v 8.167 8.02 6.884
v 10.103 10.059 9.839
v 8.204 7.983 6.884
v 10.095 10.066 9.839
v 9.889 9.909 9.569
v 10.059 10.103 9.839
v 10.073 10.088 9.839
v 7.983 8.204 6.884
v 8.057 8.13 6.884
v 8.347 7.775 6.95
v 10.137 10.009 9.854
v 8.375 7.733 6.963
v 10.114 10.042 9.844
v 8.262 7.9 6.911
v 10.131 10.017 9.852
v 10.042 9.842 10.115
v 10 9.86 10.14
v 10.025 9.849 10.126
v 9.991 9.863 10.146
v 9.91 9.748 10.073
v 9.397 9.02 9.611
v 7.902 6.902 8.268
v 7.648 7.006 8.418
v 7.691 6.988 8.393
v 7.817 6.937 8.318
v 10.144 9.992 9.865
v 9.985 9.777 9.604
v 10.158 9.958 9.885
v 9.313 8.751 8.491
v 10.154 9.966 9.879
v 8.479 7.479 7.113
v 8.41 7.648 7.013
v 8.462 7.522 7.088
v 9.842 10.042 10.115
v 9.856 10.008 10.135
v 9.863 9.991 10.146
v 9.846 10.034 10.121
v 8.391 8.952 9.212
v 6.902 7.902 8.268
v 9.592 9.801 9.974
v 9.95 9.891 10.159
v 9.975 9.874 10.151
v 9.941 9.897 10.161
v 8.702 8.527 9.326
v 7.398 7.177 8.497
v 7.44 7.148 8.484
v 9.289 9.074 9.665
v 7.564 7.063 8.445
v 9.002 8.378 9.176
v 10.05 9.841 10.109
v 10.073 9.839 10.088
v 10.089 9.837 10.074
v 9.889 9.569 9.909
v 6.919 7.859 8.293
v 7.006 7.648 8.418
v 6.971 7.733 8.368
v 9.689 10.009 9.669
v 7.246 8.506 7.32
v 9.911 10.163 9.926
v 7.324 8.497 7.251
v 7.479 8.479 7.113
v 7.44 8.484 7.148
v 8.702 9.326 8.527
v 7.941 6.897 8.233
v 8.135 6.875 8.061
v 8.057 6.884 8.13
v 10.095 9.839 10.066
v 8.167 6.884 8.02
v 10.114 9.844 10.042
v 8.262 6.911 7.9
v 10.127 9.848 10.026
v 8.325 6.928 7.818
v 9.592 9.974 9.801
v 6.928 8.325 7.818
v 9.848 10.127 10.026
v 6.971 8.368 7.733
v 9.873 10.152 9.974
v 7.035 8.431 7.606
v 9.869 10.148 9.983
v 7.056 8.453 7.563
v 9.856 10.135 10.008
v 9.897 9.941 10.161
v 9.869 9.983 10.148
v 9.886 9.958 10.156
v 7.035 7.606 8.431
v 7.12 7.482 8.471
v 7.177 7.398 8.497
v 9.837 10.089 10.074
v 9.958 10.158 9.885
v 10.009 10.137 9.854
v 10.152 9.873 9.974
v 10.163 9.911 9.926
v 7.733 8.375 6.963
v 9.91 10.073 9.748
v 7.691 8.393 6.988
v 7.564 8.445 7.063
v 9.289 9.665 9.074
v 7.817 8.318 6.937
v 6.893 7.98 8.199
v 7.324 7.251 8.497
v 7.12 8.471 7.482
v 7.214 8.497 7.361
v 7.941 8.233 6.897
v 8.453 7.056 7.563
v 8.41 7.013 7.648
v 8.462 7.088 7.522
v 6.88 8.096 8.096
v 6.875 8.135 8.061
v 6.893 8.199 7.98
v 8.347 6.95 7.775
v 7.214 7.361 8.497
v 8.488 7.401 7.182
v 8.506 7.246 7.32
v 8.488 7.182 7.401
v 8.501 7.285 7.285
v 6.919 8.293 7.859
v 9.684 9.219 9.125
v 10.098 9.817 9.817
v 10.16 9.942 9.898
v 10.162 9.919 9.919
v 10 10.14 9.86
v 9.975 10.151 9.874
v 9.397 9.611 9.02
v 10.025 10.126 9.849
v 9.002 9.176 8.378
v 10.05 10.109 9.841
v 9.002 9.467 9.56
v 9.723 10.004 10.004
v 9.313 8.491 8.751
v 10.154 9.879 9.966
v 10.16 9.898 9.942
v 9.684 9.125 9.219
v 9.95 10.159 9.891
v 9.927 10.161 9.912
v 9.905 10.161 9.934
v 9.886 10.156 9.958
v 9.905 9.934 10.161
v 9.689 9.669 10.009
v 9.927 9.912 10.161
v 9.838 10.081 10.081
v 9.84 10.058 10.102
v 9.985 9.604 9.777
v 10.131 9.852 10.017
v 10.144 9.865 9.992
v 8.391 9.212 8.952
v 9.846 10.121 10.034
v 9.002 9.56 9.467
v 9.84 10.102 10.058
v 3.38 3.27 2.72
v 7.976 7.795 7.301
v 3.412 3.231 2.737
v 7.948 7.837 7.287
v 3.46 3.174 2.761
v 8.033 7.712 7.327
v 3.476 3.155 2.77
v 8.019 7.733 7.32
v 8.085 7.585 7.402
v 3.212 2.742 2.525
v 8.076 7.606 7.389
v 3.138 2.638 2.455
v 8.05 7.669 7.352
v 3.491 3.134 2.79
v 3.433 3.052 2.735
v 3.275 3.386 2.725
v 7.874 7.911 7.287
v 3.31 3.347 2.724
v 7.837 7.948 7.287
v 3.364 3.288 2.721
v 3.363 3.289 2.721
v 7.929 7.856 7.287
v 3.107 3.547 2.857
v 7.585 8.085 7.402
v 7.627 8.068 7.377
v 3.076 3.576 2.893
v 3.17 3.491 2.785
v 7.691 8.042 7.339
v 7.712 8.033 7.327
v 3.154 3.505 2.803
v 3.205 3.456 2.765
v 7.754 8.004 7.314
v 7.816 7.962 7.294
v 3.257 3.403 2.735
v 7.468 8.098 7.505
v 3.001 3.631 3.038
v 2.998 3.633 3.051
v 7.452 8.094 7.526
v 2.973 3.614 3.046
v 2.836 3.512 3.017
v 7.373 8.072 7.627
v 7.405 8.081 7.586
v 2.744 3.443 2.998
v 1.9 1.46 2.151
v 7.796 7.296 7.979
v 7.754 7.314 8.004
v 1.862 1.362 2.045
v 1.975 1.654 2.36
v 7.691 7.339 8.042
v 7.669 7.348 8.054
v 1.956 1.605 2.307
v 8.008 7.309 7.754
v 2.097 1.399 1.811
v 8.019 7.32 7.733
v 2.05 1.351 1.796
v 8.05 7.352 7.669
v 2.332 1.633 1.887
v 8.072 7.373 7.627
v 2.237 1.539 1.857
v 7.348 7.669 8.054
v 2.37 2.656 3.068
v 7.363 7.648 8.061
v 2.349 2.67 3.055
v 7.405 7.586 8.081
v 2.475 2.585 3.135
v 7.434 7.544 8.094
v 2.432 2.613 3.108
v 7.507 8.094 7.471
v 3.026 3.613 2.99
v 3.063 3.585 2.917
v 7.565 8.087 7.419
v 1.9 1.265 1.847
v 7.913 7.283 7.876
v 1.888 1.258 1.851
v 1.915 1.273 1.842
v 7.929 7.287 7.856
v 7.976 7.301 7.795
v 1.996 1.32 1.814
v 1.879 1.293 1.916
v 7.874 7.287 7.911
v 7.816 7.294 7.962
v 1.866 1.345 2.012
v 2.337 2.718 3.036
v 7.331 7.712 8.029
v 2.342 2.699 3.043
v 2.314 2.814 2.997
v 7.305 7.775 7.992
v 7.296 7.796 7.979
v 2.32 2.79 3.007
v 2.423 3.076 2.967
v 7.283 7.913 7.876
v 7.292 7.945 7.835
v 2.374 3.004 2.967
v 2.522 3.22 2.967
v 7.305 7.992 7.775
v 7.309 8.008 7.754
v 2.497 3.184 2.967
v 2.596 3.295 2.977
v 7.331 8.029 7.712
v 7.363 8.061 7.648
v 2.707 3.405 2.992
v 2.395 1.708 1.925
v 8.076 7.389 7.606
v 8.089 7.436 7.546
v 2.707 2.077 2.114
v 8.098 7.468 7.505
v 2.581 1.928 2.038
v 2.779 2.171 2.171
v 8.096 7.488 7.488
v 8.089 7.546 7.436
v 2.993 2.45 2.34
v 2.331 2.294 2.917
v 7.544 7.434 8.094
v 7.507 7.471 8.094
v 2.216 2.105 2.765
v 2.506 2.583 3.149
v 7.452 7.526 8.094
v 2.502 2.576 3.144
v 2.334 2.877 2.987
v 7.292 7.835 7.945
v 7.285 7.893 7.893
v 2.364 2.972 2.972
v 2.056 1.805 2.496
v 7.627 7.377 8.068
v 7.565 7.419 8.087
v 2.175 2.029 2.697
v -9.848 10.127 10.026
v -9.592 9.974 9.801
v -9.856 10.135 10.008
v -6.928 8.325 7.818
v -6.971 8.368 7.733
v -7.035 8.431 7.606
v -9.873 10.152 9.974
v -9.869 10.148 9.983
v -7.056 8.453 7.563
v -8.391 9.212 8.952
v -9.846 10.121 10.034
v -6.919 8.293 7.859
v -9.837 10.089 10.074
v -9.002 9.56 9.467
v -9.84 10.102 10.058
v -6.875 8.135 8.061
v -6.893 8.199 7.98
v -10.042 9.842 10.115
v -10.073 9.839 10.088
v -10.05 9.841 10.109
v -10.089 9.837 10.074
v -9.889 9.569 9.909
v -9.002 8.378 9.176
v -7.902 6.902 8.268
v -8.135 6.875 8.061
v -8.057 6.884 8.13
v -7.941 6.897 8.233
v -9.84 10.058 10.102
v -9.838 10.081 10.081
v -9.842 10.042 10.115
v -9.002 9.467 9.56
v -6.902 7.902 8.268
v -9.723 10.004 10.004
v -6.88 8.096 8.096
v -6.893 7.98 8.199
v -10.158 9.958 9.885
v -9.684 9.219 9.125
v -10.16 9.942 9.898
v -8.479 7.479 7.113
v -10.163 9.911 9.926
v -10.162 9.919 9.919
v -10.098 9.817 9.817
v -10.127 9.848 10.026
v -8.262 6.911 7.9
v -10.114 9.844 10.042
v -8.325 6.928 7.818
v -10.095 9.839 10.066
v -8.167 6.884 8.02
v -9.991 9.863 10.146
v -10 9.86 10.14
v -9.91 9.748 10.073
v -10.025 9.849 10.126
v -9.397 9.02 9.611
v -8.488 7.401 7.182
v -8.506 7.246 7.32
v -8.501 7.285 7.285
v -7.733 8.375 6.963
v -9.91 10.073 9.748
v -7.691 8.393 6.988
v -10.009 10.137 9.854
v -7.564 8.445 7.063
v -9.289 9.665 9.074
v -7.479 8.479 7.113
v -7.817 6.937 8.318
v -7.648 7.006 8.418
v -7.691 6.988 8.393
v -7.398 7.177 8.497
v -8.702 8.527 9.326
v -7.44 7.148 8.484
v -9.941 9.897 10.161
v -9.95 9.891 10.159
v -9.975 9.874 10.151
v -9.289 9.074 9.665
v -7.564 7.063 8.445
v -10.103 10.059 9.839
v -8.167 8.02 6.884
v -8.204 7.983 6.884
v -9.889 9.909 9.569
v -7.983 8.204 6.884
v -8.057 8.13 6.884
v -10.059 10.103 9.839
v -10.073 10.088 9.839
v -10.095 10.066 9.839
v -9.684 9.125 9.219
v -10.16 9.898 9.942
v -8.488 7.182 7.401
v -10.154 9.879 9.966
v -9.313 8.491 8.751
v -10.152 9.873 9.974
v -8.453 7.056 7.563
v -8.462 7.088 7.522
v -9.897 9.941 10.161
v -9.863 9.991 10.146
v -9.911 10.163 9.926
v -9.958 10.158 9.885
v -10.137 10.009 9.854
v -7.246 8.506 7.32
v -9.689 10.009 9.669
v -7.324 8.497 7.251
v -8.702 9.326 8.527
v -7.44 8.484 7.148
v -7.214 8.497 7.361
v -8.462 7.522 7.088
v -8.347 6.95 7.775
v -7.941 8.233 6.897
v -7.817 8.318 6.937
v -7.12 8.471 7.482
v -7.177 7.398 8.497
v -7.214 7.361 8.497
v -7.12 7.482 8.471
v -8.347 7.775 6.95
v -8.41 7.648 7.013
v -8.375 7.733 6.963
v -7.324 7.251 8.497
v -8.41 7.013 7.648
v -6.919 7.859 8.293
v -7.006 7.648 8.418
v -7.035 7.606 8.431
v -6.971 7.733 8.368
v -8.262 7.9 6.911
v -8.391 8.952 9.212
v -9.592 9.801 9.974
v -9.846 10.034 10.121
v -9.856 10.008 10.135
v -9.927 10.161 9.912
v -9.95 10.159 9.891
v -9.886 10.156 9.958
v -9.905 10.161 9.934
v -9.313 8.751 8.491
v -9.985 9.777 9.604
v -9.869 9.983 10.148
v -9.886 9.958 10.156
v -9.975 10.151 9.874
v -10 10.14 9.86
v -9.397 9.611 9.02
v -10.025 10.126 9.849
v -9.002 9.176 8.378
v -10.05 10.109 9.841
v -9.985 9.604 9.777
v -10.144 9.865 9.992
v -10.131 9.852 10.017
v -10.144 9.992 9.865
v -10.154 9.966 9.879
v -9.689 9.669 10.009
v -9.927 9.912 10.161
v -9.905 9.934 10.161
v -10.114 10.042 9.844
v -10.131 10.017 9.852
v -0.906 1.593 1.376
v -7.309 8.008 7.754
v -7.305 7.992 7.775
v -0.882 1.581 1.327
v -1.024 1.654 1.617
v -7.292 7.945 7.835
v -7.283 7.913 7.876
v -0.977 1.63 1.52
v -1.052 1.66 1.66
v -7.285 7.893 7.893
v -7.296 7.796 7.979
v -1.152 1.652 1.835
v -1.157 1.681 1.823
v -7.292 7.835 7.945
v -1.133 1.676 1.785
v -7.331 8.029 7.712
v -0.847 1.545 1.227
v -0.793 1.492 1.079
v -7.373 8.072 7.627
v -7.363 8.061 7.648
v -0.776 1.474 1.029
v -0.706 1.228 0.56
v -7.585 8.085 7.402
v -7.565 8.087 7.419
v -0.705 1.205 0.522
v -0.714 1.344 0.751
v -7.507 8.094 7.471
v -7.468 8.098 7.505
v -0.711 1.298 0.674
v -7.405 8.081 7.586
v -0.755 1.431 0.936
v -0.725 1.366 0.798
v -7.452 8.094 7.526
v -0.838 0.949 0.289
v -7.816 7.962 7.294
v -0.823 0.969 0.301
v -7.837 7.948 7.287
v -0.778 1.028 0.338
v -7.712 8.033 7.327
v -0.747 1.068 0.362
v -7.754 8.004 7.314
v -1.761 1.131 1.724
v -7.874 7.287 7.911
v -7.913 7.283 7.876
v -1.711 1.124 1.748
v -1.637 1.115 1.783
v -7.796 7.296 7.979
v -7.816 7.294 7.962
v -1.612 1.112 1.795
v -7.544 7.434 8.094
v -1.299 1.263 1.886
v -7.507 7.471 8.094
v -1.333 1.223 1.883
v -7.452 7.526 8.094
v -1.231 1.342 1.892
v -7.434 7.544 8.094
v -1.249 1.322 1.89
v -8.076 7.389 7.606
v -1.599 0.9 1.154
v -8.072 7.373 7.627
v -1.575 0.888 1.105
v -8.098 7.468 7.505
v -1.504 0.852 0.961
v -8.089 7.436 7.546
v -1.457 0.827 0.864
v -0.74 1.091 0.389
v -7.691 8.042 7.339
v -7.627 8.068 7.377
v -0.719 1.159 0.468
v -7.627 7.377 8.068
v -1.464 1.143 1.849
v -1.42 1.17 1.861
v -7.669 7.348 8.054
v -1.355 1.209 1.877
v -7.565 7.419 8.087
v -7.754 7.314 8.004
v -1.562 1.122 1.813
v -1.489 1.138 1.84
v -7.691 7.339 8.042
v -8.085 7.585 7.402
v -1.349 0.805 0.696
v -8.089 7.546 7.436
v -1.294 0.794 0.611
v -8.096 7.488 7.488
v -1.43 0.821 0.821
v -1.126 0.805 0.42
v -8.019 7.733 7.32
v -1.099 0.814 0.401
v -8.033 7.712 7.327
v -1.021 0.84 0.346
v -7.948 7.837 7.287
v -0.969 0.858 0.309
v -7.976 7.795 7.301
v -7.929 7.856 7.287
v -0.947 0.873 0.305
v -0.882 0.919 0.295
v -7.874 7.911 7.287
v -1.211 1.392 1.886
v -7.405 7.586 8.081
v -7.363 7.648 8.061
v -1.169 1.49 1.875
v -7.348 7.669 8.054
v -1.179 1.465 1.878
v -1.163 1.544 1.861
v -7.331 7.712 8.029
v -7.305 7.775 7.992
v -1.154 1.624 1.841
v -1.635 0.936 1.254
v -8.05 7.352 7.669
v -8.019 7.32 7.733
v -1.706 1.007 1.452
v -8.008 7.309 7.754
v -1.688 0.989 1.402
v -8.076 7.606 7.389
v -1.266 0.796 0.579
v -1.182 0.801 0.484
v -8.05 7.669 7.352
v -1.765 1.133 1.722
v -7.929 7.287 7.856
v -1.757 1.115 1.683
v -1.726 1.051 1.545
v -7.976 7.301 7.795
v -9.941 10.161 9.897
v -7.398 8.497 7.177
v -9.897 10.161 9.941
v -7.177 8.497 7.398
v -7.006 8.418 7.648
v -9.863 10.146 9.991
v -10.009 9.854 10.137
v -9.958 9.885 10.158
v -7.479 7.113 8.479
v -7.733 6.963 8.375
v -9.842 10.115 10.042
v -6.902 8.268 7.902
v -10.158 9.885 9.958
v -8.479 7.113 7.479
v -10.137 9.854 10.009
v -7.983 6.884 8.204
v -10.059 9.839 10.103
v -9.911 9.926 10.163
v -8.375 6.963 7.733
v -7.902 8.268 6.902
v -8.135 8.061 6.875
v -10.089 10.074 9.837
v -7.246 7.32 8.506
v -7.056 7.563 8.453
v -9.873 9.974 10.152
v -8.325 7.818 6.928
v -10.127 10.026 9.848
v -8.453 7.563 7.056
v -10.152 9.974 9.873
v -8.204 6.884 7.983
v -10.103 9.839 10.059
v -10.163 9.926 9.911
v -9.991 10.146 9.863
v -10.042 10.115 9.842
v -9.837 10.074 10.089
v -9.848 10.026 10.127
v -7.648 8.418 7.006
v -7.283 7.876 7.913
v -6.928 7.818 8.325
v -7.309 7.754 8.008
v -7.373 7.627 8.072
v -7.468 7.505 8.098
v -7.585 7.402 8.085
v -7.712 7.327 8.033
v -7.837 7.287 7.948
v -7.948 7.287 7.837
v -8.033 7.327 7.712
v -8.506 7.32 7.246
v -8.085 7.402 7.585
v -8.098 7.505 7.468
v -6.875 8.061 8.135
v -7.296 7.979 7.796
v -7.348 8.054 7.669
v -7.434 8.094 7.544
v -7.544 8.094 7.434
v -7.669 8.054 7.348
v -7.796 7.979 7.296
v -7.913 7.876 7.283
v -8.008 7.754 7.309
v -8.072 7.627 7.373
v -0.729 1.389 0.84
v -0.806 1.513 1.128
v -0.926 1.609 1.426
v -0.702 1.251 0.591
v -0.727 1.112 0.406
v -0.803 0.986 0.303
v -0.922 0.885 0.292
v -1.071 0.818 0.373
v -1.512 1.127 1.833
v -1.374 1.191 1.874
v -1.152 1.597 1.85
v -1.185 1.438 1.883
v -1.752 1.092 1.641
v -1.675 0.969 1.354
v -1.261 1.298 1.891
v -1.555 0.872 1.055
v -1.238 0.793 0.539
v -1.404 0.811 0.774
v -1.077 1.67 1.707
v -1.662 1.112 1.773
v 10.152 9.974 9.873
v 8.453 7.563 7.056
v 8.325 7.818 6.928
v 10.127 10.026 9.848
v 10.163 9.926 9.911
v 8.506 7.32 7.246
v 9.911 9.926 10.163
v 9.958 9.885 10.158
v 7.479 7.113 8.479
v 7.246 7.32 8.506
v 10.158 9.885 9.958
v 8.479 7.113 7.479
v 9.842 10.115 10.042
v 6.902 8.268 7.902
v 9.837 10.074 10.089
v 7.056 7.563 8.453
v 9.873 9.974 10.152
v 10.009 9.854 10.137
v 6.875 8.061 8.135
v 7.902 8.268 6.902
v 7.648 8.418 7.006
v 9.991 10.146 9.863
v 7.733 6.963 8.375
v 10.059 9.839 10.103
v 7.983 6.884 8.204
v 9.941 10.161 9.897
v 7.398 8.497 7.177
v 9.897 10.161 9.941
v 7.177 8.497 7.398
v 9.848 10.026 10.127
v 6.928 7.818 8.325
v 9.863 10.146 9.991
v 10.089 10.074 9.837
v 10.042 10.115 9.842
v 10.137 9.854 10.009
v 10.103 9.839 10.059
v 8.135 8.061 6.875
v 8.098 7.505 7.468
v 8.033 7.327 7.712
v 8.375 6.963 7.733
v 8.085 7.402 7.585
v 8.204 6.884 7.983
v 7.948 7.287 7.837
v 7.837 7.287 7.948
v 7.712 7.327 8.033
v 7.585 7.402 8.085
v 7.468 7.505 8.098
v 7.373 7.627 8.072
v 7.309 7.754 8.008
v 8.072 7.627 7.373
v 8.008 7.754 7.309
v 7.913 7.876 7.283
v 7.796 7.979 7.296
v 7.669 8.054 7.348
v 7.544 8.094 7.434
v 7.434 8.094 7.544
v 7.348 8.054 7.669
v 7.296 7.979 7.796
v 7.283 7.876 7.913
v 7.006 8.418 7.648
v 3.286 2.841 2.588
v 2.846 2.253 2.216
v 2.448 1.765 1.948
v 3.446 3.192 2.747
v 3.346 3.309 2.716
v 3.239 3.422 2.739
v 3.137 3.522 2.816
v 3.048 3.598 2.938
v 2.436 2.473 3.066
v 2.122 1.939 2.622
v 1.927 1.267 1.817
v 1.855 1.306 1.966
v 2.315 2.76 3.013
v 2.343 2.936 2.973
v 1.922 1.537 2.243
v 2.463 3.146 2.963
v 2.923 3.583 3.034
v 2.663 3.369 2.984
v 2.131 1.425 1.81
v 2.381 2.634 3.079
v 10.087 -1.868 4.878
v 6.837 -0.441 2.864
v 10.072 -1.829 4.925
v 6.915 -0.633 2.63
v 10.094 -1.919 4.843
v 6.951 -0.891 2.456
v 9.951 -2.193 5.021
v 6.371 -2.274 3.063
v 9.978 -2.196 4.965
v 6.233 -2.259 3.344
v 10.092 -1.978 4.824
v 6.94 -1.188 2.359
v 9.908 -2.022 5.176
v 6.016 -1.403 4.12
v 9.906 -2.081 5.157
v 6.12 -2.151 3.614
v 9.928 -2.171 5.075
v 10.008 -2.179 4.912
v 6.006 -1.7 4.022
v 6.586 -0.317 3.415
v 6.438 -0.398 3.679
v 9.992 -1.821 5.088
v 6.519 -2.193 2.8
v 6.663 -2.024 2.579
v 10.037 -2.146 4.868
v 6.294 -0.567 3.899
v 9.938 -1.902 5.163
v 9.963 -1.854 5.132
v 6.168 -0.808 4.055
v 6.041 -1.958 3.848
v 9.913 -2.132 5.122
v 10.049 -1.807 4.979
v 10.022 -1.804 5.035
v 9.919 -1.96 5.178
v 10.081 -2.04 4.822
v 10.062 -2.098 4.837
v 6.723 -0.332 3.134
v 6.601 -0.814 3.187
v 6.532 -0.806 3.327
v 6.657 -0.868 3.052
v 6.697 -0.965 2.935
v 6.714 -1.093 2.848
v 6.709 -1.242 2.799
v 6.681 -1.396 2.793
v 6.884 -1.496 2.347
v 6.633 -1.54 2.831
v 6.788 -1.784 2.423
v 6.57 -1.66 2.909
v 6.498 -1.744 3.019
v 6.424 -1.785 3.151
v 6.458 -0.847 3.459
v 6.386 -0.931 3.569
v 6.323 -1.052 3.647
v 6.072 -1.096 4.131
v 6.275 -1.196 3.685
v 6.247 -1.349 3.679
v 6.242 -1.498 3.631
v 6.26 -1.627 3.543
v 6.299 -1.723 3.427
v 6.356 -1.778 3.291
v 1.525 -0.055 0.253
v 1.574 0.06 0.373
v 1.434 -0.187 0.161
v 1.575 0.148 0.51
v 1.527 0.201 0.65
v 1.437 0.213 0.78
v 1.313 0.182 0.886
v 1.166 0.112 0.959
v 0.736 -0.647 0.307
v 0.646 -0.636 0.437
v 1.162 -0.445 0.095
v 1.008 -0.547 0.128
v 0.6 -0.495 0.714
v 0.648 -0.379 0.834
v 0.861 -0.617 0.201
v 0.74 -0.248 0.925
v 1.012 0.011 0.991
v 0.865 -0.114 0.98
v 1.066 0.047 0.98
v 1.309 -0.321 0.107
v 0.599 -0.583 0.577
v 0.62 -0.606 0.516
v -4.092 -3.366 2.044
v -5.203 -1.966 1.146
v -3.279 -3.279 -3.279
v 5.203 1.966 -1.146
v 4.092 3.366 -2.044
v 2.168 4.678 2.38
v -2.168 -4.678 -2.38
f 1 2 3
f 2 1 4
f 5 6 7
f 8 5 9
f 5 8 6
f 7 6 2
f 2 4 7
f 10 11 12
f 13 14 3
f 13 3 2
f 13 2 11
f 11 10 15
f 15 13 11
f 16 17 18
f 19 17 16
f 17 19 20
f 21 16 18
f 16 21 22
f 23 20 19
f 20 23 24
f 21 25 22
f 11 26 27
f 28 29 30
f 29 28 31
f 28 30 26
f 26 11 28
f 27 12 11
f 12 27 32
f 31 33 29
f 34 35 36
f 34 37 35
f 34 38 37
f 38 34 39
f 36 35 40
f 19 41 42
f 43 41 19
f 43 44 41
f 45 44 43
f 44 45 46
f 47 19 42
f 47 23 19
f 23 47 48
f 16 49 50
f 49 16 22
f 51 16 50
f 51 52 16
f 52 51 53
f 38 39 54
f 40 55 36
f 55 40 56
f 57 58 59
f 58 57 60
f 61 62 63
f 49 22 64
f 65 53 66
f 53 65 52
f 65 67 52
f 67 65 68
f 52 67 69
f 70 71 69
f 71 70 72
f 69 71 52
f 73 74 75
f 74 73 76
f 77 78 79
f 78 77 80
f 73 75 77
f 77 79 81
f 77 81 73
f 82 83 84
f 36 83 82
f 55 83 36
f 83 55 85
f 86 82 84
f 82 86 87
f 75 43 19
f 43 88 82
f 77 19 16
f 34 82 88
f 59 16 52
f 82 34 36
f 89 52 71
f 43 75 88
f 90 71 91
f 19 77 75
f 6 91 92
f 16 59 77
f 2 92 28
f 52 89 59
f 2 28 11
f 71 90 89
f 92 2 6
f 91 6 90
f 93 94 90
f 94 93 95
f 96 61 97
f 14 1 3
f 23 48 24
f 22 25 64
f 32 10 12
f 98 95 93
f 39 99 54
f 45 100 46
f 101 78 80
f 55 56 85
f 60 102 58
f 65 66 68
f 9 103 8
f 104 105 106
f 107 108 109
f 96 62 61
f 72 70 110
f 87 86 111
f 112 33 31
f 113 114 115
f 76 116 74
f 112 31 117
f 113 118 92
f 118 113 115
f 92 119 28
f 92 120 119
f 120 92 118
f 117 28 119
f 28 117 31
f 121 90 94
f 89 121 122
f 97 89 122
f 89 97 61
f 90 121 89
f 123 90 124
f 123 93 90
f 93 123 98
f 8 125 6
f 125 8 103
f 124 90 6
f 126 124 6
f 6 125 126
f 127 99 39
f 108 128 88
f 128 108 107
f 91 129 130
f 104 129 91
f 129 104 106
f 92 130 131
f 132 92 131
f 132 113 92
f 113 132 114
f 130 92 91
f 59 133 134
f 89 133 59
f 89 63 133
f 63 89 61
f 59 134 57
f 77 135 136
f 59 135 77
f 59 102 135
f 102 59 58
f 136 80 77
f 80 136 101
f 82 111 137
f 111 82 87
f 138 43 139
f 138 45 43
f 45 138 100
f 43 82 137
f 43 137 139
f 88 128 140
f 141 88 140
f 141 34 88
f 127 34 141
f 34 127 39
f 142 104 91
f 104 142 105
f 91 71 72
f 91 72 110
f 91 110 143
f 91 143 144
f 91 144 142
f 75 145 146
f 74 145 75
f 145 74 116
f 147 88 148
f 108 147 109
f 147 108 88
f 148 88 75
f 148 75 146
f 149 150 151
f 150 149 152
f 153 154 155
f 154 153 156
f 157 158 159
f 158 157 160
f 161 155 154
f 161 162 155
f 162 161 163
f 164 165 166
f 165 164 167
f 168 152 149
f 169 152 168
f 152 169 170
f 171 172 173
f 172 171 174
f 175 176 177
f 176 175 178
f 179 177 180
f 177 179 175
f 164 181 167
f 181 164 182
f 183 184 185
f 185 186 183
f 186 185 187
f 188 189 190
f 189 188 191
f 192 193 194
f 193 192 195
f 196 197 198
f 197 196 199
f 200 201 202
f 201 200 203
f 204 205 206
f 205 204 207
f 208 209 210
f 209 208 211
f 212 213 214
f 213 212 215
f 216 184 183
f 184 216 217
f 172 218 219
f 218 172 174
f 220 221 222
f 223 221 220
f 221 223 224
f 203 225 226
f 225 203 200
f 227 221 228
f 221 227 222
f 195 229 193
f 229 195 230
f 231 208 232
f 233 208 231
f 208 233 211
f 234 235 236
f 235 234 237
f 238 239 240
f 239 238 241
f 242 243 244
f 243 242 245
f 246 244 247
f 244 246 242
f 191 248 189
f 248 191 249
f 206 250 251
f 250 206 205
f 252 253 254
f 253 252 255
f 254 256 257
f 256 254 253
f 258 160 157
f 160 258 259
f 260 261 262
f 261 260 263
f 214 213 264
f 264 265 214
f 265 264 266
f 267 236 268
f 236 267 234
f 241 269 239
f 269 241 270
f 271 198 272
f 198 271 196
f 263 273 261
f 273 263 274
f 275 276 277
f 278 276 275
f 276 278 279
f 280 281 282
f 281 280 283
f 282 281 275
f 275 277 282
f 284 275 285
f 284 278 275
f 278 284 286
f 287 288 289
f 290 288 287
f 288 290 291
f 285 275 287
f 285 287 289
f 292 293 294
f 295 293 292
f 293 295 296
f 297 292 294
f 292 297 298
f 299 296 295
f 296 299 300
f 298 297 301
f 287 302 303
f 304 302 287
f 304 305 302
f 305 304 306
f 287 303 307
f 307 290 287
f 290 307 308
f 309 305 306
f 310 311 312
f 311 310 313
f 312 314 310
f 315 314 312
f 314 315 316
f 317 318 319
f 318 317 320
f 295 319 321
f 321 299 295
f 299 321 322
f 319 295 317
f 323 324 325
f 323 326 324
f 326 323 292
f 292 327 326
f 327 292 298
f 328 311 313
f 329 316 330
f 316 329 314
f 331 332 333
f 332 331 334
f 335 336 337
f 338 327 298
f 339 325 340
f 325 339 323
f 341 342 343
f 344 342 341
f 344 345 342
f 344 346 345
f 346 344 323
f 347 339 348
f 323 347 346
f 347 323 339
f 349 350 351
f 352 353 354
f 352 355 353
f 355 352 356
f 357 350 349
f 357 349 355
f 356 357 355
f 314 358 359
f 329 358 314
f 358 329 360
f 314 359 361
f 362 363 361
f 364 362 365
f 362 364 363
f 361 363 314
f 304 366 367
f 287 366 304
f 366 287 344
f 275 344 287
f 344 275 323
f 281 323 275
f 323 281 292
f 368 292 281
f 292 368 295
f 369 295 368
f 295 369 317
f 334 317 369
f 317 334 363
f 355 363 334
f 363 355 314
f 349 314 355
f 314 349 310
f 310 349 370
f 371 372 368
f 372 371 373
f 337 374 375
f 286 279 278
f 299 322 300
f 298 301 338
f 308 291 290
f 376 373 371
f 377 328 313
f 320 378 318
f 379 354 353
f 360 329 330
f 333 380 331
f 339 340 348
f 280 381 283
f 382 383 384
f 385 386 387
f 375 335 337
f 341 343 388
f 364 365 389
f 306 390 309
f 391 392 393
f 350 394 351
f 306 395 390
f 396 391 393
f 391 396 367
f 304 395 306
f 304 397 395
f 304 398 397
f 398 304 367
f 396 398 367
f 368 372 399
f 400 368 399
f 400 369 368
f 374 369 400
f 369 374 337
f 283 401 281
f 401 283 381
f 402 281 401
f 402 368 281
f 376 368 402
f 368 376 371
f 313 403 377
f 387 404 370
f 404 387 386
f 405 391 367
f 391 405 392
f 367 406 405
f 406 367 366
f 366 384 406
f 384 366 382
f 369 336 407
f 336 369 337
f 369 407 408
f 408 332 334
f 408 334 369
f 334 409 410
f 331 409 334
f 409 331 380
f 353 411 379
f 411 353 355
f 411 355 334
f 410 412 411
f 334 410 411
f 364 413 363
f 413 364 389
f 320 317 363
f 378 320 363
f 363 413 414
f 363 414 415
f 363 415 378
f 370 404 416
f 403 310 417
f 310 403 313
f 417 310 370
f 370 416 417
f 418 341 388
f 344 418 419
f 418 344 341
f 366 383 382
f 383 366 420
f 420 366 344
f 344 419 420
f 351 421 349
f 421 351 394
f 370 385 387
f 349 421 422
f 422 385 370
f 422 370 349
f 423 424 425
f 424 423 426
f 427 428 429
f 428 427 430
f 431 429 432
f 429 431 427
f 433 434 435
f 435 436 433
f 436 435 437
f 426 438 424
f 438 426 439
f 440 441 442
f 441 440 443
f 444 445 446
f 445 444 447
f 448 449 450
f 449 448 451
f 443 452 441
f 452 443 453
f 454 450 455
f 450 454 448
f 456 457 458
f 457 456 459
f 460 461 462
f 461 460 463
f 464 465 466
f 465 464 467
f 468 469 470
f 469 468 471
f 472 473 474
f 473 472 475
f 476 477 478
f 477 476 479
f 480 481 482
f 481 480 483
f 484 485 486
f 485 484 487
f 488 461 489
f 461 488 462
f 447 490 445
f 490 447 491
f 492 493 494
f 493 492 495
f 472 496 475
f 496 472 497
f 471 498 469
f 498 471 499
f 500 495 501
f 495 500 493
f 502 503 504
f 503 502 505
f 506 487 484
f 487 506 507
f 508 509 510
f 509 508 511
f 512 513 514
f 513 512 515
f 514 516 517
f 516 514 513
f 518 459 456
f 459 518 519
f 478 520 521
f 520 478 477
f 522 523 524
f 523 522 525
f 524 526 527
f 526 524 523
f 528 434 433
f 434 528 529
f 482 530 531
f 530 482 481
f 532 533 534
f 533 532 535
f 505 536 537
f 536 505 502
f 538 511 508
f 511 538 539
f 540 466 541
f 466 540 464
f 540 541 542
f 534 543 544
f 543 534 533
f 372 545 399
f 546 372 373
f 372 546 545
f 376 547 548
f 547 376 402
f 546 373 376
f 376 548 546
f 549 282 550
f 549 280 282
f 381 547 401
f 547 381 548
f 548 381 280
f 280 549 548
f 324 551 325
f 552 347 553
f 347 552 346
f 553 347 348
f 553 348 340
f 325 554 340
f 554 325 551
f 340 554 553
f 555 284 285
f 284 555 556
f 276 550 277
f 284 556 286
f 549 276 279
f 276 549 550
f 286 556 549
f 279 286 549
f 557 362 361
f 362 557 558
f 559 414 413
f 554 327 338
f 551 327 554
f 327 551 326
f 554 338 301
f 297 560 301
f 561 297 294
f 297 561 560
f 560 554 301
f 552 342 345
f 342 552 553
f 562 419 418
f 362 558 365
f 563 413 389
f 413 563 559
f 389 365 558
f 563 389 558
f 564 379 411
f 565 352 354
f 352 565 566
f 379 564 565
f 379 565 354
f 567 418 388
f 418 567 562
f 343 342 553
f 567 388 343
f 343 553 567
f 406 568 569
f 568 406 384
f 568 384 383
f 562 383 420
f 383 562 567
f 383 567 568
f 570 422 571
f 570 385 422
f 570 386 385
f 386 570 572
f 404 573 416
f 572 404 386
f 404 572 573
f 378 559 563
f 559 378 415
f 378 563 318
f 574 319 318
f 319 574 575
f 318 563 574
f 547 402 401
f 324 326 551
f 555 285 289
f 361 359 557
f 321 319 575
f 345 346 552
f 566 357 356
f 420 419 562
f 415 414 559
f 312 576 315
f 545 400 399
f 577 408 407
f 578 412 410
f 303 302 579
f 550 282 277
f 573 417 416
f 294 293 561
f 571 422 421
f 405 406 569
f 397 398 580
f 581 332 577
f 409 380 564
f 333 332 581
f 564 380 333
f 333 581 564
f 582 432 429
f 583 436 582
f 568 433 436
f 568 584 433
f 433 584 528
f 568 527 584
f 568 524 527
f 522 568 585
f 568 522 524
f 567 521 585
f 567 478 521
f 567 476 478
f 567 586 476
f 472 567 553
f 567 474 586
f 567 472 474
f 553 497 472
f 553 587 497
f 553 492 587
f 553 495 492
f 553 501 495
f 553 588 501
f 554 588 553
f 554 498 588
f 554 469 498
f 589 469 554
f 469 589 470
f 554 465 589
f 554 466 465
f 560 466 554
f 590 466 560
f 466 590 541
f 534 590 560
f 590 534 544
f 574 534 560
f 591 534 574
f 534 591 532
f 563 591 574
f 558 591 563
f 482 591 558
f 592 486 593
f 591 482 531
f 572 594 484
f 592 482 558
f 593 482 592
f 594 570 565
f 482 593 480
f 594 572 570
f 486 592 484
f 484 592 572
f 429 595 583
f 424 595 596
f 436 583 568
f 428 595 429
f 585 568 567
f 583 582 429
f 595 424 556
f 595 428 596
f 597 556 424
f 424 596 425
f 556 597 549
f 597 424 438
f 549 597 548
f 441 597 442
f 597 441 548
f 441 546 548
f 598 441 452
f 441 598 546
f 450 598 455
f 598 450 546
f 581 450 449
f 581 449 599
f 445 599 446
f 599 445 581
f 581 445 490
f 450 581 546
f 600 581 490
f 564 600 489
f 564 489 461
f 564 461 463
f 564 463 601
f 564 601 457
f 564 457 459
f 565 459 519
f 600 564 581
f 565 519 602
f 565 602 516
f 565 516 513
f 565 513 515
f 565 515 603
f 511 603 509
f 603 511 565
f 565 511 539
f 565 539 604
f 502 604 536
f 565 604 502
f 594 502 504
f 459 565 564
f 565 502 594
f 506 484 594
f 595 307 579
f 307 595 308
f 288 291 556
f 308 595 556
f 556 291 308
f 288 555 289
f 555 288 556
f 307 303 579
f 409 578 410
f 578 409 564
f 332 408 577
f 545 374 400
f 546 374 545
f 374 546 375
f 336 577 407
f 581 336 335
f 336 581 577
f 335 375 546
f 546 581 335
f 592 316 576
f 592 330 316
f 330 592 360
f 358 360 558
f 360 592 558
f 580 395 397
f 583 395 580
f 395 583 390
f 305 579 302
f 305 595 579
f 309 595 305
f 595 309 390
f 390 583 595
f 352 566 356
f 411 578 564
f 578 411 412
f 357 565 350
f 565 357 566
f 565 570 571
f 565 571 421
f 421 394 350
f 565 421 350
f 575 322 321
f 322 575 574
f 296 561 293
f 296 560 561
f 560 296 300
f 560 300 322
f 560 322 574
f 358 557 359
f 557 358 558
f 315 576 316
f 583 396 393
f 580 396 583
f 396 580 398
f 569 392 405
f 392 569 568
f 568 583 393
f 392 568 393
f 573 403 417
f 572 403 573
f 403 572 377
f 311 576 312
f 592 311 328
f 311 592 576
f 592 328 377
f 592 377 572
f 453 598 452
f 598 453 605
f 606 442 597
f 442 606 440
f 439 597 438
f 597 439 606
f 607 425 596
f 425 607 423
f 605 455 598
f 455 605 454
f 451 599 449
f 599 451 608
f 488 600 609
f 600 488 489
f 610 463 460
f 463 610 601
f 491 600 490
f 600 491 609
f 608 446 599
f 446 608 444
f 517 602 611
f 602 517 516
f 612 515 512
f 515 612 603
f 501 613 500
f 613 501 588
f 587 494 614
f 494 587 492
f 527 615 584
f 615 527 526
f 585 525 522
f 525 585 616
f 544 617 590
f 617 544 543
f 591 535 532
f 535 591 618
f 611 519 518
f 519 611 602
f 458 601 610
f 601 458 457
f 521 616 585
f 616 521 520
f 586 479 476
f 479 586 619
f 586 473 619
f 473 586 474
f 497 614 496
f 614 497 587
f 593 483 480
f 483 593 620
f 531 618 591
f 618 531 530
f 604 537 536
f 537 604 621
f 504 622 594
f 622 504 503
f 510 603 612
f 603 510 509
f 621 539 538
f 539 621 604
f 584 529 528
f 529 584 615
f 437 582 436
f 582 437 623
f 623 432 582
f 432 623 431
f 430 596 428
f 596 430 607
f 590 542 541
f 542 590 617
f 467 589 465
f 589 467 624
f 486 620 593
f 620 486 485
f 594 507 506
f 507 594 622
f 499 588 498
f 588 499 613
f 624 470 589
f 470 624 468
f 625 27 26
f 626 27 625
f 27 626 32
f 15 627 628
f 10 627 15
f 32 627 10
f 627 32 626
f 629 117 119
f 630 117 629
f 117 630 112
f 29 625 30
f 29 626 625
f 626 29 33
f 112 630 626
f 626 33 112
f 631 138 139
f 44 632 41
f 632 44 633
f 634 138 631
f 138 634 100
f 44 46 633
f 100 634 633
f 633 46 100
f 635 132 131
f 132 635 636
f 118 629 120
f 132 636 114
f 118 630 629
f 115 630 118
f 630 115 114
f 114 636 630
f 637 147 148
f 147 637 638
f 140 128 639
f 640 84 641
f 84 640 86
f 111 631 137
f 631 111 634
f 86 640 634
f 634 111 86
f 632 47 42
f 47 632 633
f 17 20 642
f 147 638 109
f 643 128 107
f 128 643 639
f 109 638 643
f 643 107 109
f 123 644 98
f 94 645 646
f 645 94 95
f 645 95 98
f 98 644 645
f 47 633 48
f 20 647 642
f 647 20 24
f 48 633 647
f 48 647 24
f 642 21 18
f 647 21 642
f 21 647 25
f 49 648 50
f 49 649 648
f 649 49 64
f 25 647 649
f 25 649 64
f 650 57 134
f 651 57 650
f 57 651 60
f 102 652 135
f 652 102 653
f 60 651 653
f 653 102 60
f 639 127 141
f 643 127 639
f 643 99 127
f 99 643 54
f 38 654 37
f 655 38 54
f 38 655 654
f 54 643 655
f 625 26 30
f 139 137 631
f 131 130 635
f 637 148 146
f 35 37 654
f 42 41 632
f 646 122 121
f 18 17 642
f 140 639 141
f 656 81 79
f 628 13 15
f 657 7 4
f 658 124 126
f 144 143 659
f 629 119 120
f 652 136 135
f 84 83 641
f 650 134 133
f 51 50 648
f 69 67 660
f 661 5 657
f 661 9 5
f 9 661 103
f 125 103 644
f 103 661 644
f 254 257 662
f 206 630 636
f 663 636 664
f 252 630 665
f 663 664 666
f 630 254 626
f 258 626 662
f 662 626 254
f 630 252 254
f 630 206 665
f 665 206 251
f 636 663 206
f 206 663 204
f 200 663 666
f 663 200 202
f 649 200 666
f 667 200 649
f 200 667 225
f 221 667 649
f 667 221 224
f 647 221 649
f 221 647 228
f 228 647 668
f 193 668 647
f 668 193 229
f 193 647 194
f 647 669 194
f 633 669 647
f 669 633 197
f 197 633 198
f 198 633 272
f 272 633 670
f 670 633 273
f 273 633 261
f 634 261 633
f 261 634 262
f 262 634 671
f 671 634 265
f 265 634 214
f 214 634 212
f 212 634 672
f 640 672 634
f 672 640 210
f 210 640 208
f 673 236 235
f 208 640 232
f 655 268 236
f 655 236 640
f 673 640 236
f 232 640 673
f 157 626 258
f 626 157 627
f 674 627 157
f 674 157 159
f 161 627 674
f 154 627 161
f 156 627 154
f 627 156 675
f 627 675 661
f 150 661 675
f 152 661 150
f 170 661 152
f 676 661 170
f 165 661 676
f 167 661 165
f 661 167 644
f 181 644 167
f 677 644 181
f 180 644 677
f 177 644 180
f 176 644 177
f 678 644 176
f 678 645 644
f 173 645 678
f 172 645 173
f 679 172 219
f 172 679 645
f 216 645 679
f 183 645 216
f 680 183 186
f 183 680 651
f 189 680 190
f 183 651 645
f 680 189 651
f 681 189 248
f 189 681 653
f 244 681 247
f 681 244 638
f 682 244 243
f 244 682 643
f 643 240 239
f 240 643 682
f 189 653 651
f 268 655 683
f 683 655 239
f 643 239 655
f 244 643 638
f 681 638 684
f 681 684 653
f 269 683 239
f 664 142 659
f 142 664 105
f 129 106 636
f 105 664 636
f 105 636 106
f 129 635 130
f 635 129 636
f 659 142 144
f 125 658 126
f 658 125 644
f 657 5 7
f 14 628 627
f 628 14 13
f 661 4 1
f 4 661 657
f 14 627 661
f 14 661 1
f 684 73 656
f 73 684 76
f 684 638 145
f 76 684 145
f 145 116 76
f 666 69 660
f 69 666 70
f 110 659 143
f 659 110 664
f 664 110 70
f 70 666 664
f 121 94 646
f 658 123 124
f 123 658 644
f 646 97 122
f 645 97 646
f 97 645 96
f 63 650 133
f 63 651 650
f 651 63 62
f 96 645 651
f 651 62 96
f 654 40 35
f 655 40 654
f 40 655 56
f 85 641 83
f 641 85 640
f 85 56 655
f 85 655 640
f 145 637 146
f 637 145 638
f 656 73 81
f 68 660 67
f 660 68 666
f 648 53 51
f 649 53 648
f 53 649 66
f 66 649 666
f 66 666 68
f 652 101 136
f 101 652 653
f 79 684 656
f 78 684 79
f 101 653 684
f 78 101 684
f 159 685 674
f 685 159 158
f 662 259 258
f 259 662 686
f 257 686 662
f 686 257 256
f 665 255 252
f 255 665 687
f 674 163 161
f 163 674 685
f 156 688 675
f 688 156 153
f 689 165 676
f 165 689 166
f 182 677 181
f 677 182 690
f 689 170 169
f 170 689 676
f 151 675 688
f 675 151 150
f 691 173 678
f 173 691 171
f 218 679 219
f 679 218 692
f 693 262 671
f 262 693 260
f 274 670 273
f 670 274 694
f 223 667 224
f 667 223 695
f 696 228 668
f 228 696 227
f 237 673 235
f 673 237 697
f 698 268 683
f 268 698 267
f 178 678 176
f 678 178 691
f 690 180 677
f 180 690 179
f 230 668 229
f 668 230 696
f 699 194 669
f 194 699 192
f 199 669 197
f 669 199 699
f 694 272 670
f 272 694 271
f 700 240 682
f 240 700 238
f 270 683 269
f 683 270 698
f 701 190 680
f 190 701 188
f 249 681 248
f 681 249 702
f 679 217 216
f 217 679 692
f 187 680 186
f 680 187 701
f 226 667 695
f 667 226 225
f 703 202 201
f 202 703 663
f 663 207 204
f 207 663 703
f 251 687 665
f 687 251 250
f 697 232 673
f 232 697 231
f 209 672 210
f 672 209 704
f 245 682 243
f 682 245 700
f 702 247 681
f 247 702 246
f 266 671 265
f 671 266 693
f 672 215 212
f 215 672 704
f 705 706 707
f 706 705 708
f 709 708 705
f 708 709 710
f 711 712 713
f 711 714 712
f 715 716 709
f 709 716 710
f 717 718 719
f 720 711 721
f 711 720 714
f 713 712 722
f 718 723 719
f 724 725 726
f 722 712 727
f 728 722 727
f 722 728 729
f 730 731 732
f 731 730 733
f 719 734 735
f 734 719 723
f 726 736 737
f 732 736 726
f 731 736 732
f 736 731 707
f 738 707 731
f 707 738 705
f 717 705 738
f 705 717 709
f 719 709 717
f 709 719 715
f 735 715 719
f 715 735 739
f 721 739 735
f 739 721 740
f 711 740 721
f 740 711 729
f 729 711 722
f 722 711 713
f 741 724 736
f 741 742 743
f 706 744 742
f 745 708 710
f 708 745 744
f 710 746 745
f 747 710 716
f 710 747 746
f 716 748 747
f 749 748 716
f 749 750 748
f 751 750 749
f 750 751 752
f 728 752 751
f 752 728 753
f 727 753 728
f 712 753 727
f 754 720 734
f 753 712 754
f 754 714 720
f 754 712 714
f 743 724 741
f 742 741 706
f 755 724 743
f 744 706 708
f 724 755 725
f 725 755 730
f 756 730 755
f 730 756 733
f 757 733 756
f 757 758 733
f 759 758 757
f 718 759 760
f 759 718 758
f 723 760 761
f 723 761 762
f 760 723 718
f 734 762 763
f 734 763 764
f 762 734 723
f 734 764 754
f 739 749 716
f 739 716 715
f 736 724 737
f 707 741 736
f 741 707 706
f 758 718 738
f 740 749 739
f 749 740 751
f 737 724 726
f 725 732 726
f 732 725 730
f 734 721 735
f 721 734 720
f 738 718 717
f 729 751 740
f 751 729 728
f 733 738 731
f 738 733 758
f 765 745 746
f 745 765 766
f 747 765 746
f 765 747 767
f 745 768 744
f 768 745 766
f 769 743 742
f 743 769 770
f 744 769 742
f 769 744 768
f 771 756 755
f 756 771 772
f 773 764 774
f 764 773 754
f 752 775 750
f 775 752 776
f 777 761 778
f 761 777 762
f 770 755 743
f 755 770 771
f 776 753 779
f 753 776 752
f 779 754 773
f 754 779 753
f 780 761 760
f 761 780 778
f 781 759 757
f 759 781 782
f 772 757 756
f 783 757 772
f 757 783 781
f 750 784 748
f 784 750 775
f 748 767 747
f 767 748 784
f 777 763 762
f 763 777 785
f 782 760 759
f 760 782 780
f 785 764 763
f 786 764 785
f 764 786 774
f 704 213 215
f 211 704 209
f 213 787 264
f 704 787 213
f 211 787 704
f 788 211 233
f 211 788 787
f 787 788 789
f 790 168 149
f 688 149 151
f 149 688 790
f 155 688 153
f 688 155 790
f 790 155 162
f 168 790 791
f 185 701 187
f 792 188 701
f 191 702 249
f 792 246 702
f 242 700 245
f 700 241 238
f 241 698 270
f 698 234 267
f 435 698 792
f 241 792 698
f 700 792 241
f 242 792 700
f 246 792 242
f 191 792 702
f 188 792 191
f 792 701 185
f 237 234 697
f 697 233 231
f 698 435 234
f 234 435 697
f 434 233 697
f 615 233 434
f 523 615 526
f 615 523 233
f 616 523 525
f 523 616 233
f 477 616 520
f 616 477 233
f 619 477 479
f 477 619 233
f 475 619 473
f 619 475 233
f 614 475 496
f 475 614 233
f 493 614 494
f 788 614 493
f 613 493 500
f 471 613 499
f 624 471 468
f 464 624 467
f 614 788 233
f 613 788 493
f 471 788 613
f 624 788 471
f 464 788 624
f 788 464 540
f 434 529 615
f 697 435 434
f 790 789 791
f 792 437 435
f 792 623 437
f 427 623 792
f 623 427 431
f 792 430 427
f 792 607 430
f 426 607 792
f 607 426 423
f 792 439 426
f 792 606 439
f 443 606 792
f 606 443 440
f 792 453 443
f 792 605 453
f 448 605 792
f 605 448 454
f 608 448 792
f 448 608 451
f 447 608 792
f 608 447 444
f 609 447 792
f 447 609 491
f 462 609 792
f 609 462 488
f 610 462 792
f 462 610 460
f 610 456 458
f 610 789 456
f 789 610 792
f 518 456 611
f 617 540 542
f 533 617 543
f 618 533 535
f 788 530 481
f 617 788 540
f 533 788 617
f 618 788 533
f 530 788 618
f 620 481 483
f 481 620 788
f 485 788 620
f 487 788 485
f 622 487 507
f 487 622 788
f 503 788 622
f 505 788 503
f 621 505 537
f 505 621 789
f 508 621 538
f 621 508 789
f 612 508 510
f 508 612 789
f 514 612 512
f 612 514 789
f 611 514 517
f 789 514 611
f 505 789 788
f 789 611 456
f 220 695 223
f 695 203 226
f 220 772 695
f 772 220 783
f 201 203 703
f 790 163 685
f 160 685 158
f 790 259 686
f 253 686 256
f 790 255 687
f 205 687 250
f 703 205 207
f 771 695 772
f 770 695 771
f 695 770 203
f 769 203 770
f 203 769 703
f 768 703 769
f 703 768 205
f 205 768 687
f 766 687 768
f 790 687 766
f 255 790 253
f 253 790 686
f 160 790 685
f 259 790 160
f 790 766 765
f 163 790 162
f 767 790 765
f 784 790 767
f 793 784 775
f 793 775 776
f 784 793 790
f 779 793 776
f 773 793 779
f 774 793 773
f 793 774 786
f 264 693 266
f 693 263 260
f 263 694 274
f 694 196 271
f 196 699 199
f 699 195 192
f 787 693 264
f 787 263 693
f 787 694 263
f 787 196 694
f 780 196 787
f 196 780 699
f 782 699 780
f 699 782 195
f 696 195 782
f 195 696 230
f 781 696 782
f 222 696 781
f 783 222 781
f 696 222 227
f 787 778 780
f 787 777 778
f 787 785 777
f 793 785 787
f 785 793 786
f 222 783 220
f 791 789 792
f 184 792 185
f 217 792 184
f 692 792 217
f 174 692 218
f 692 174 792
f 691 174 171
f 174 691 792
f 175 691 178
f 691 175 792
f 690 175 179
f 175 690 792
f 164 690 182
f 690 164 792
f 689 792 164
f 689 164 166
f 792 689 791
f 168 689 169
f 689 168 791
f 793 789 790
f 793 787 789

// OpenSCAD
//---------------------------------------------------------------
//-- Openscad vector library
//-- This is a component of the obiscad opescad tools by Obijuan
//-- (C) Juan Gonzalez-Gomez (Obijuan)
//-- Sep-2012
//---------------------------------------------------------------
//-- Released under the GPL license
//---------------------------------------------------------------

//-- Updated orientate function to correct singularity when v lies along vref

//----------------------------------------
//-- FUNCTIONS FOR WORKING WITH VECTORS
//----------------------------------------

//-- Calculate the module of a vector
function mod(v) = (sqrt(v[0]*v[0]+v[1]*v[1]+v[2]*v[2]));

//-- Calculate the cros product of two vectors
function cross(u,v) = [
  u[1]*v[2] - v[1]*u[2],
  -(u[0]*v[2] - v[0]*u[2]) ,
  u[0]*v[1] - v[0]*u[1]];

//-- Calculate the dot product of two vectors
function dot(u,v) = u[0]*v[0]+u[1]*v[1]+u[2]*v[2];

//-- Return the unit vector of a vector
function unitv(v) = v/mod(v);

//-- Return the angle between two vectores
function anglev(u,v) = acos( dot(u,v) / (mod(u)*mod(v)) );

//----------------------------------------------------------
//--  Draw a point in the position given by the vector p  
//----------------------------------------------------------
module point(p)
{
  translate(p)
    sphere(r=0.7,$fn=20);
}

//------------------------------------------------------------------
//-- Draw a vector poiting to the z axis
//-- This is an auxiliary module for implementing the vector module
//--
//-- Parameters:
//--  l: total vector length (line + arrow)
//--  l_arrow: Vector arrow length
//--  mark: If true, a mark is draw in the vector head, for having
//--    a visual reference of the rolling angle
//------------------------------------------------------------------
module vectorz(l=10, l_arrow=4, mark=false)
{
  //-- vector body length (not including the arrow)
  lb = l - l_arrow;

  //-- The vector is locatead at 0,0,0
  translate([0,0,lb/2])
  union() {

    //-- Draw the arrow
    translate([0,0,lb/2])
      cylinder(r1=2/2, r2=0.2, h=l_arrow, $fn=20);

    //-- Draw the mark
    if (mark) {
      translate([0,0,lb/2+l_arrow/2])
      translate([1,0,0])
        cube([2,0.3,l_arrow*0.8],center=true);
    }

    //-- Draw the body
    cylinder(r=1/2, h=lb, center=true, $fn=20);
  }

  //-- Draw a sphere in the vector base
  sphere(r=1/2, $fn=20);
}

//-----------------------------------------------------------------
//-- ORIENTATE OPERATOR
//--
//--  Orientate an object to the direction given by the vector v
//--  Parameters:
//--    v : Target orientation
//--    vref: Vector reference. It is the vector of the local frame
//--          of the object that want to be poiting in the direction
//--          of v
//--    roll: Rotation of the object around the v axis
//-------------------------------------------------------------------
module orientate(v,vref=[0,0,1], roll=0)
{
  //-- Calculate the rotation axis
  raxis = v[0]==vref[0] && v[1]==vref[1] ? [0,1,0] : cross(vref,v);
  
  //-- Calculate the angle between the vectors
  ang = anglev(vref,v);

  //-- Rotate the child!
  rotate(a=roll, v=v)
    rotate(a=ang, v=raxis)
      child(0);
}

module orientate2(v,vref=[0,0,1], roll=0)
{
  //-- Calculate the rotation axis
  raxis = cross(vref,v);
  
  //-- Calculate the angle between the vectors
  ang = anglev(vref,v);

  //-- Rotate the child!
  rotate(a=roll, v=v)
    rotate(a=ang, v=raxis)
      child(0);
}

//---------------------------------------------------------------------------
//-- Draw a vector 
//--
//-- There are two modes of drawing the vector
//-- * Mode 1: Given by a cartesian point(x,y,z). A vector from the origin
//--           to the end (x,y,z) is drawn. The l parameter (length) must 
//--           be 0  (l=0)
//-- * Mode 2: Give by direction and length
//--           A vector of length l pointing to the direction given by
//--           v is drawn
//---------------------------------------------------------------------------
//-- Parameters:
//--  v: Vector cartesian coordinates
//--  l: total vector length (line + arrow)
//--  l_arrow: Vector arrow length
//    mark: If true, a mark is draw in the vector head, for having
//--    a visual reference of the rolling angle
//---------------------------------------------------------------------------
module vector(v,l=0, l_arrow=4, mark=false)
{
  //-- Get the vector length from the coordinates
  mod = mod(v);

  //-- The vector is very easy implemented by means of the orientate
  //-- operator:
  //--  orientate(v) vectorz(l=mod, l_arrow=l_arrow)
  //--  BUT... in OPENSCAD 2012.02.22 the recursion does not
  //--    not work, so that if the user use the orientate operator
  //--    on a vector, openscad will ignore it..
  //-- The solution at the moment (I hope the openscad developers
  //--  implement the recursion in the near future...)
  //--  is to repite the orientate operation in this module

  //---- SAME CALCULATIONS THAN THE ORIENTATE OPERATOR!
  //-- Calculate the rotation axis

  vref = [0,0,1];
  raxis = cross(vref,v);
  
  //-- Calculate the angle between the vectors
  ang = anglev(vref,v);

  //-- orientate the vector
  //-- Draw the vector. The vector length is given either
  //--- by the mod variable (when l=0) or by l (when l!=0)
  if (l==0)
    rotate(a=ang, v=raxis)
      vectorz(l=mod, l_arrow=l_arrow, mark=mark);
  else
    rotate(a=ang, v=raxis)
      vectorz(l=l, l_arrow=l_arrow, mark=mark);

}

//----------------------------------------------------
//-- Draw a Frame of reference
//-- Parameters:
//-- l: length of the Unit vectors
//-----------------------------------------------------
module frame(l=10, l_arrow=4)
{

  //-- Z unit vector
  color("Blue")
    vector([0,0,l], l_arrow=l_arrow);

  //-- X unit vector
  color("Red")
    vector([l,0,0], l_arrow=l_arrow );

  //-- Y unit vector
  color("Green")
    vector([0,l,0],l_arrow=l_arrow);

  //-- Origin
  color("Gray")
    sphere(r=1, $fn=20);
}

//--------------------------------------------------
//-- Modules for testings and examples
//-- Testing that the vector library is working ok
//--------------------------------------------------

//-- 22 vectors in total are drawn, poiting to different directions
module Test_vectors1()
{

  a = 20;
  k = 1;

  //--  Add a frame of reference (in the origin)
  frame(l=a);

  //-- Negative vectors, pointing towards the three axis: -x, -y, -z
  color("Red")   vector([-a, 0,  0]);
  color("Green") vector([0, -a,  0]);
  color("Blue")  vector([0,  0, -a]);

  //-- It is *not* has been implemented using a for loop on purpose
  //-- This way, individual vectors can be commented out or highlighted

  //-- vectors with positive z
  vector([a,   a, a*k]);
  vector([0,   a, a*k]);
  vector([-a,  a, a*k]);
  vector([-a,  0, a*k]);

  vector([-a, -a, a*k]);
  vector([0,  -a, a*k]);
  vector([a,  -a, a*k]);
  vector([a,   0, a*k]);


  //-- Vectors with negative z
  vector([a,   a, -a*k]);
  vector([0,   a, -a*k]);
  vector([-a,  a, -a*k]);
  vector([-a,  0, -a*k]);

  vector([-a, -a, -a*k]);
  vector([0,  -a, -a*k]);
  vector([a,  -a, -a*k]);
  vector([a,   0, -a*k]);
}

//--- Another test...
module Test_vectors2()
{

  //-- Add the vector into the vector table
  //-- This vectors are taken as directions
  //-- All the vectors will be drawn with the same length (l)
  vector_table = [
    [1,   1, 1],
    [0,   1, 1],
    [-1,  1, 1],
    [-1,  0, 1],
    [-1, -1, 1],
    [0,  -1, 1],
    [1,  -1, 1],
    [1,   0, 1],
  
    [1,   1, -1],
    [0,   1, -1],
    [-1,  1, -1],
    [-1,  0, -1],
    [-1, -1, -1],
    [0,  -1, -1],
    [1,  -1, -1],
    [1,   0, -1],
  ];

  //-- Vector length
  l=20;

  frame(l=10);

  //-- Draw all the vector given in the table
  //-- The vectors point to the direction given in the table
  //-- They all are drawn with a length equal to l
  for (v=vector_table) {
    //-- Vector given by direction and length
    vector(v,l=l);
  }
}


//-- Test the cross product and the angle
//-- between vectors
module Test_vector3()
{
  //-- Start with 2 unit vectors
  v=unitv([1,1,1]);
  u=unitv([0,1,0]);

  //-- Draw the vector in different colors
  //-- Increase the length for drawing
  color("Red") vector(v*20);
  color("blue") vector(u*20);

  //-- Get the cross product
  w = cross(v,u);
  vector(w*20);

  //-- The cross product is NOT conmutative... 
  //-- change the order of v and u
  w2 = cross(u,v);
  vector(w2*20);

  //-- w should be perpendicular to v and u
  //-- Calculate the angles between them:
  echo("U , V: ", anglev(u,v));
  echo("W , U: ", anglev(w,u));
  echo("W , V: ", anglev(w,v));

}

//-- Test the orientate operator
module Test_vector4()
{
  o = [10,10,10];
  v = [-10,10,10];

  color("Red") vector(o);
  color("Blue") vector(v);

  //-- Orientate the vector o in the direction of v
  orientate(v,o)
    vector(o);

  //-- Inverse operation: orientate the v vector in the direction
  //-- of o
  orientate(o,v)
    vector(v);

  //-- Example of orientation of a cube
  orientate(o,vref=[10,-2,5],roll=0)
    cube([10,2,5],center=true);

  vector([10,-2,5]);

}

//-------- Perform tests......

Test_vector4();


/*

Test_vectors1();


translate([60,0,0]) 
  Test_vectors2();
*/
